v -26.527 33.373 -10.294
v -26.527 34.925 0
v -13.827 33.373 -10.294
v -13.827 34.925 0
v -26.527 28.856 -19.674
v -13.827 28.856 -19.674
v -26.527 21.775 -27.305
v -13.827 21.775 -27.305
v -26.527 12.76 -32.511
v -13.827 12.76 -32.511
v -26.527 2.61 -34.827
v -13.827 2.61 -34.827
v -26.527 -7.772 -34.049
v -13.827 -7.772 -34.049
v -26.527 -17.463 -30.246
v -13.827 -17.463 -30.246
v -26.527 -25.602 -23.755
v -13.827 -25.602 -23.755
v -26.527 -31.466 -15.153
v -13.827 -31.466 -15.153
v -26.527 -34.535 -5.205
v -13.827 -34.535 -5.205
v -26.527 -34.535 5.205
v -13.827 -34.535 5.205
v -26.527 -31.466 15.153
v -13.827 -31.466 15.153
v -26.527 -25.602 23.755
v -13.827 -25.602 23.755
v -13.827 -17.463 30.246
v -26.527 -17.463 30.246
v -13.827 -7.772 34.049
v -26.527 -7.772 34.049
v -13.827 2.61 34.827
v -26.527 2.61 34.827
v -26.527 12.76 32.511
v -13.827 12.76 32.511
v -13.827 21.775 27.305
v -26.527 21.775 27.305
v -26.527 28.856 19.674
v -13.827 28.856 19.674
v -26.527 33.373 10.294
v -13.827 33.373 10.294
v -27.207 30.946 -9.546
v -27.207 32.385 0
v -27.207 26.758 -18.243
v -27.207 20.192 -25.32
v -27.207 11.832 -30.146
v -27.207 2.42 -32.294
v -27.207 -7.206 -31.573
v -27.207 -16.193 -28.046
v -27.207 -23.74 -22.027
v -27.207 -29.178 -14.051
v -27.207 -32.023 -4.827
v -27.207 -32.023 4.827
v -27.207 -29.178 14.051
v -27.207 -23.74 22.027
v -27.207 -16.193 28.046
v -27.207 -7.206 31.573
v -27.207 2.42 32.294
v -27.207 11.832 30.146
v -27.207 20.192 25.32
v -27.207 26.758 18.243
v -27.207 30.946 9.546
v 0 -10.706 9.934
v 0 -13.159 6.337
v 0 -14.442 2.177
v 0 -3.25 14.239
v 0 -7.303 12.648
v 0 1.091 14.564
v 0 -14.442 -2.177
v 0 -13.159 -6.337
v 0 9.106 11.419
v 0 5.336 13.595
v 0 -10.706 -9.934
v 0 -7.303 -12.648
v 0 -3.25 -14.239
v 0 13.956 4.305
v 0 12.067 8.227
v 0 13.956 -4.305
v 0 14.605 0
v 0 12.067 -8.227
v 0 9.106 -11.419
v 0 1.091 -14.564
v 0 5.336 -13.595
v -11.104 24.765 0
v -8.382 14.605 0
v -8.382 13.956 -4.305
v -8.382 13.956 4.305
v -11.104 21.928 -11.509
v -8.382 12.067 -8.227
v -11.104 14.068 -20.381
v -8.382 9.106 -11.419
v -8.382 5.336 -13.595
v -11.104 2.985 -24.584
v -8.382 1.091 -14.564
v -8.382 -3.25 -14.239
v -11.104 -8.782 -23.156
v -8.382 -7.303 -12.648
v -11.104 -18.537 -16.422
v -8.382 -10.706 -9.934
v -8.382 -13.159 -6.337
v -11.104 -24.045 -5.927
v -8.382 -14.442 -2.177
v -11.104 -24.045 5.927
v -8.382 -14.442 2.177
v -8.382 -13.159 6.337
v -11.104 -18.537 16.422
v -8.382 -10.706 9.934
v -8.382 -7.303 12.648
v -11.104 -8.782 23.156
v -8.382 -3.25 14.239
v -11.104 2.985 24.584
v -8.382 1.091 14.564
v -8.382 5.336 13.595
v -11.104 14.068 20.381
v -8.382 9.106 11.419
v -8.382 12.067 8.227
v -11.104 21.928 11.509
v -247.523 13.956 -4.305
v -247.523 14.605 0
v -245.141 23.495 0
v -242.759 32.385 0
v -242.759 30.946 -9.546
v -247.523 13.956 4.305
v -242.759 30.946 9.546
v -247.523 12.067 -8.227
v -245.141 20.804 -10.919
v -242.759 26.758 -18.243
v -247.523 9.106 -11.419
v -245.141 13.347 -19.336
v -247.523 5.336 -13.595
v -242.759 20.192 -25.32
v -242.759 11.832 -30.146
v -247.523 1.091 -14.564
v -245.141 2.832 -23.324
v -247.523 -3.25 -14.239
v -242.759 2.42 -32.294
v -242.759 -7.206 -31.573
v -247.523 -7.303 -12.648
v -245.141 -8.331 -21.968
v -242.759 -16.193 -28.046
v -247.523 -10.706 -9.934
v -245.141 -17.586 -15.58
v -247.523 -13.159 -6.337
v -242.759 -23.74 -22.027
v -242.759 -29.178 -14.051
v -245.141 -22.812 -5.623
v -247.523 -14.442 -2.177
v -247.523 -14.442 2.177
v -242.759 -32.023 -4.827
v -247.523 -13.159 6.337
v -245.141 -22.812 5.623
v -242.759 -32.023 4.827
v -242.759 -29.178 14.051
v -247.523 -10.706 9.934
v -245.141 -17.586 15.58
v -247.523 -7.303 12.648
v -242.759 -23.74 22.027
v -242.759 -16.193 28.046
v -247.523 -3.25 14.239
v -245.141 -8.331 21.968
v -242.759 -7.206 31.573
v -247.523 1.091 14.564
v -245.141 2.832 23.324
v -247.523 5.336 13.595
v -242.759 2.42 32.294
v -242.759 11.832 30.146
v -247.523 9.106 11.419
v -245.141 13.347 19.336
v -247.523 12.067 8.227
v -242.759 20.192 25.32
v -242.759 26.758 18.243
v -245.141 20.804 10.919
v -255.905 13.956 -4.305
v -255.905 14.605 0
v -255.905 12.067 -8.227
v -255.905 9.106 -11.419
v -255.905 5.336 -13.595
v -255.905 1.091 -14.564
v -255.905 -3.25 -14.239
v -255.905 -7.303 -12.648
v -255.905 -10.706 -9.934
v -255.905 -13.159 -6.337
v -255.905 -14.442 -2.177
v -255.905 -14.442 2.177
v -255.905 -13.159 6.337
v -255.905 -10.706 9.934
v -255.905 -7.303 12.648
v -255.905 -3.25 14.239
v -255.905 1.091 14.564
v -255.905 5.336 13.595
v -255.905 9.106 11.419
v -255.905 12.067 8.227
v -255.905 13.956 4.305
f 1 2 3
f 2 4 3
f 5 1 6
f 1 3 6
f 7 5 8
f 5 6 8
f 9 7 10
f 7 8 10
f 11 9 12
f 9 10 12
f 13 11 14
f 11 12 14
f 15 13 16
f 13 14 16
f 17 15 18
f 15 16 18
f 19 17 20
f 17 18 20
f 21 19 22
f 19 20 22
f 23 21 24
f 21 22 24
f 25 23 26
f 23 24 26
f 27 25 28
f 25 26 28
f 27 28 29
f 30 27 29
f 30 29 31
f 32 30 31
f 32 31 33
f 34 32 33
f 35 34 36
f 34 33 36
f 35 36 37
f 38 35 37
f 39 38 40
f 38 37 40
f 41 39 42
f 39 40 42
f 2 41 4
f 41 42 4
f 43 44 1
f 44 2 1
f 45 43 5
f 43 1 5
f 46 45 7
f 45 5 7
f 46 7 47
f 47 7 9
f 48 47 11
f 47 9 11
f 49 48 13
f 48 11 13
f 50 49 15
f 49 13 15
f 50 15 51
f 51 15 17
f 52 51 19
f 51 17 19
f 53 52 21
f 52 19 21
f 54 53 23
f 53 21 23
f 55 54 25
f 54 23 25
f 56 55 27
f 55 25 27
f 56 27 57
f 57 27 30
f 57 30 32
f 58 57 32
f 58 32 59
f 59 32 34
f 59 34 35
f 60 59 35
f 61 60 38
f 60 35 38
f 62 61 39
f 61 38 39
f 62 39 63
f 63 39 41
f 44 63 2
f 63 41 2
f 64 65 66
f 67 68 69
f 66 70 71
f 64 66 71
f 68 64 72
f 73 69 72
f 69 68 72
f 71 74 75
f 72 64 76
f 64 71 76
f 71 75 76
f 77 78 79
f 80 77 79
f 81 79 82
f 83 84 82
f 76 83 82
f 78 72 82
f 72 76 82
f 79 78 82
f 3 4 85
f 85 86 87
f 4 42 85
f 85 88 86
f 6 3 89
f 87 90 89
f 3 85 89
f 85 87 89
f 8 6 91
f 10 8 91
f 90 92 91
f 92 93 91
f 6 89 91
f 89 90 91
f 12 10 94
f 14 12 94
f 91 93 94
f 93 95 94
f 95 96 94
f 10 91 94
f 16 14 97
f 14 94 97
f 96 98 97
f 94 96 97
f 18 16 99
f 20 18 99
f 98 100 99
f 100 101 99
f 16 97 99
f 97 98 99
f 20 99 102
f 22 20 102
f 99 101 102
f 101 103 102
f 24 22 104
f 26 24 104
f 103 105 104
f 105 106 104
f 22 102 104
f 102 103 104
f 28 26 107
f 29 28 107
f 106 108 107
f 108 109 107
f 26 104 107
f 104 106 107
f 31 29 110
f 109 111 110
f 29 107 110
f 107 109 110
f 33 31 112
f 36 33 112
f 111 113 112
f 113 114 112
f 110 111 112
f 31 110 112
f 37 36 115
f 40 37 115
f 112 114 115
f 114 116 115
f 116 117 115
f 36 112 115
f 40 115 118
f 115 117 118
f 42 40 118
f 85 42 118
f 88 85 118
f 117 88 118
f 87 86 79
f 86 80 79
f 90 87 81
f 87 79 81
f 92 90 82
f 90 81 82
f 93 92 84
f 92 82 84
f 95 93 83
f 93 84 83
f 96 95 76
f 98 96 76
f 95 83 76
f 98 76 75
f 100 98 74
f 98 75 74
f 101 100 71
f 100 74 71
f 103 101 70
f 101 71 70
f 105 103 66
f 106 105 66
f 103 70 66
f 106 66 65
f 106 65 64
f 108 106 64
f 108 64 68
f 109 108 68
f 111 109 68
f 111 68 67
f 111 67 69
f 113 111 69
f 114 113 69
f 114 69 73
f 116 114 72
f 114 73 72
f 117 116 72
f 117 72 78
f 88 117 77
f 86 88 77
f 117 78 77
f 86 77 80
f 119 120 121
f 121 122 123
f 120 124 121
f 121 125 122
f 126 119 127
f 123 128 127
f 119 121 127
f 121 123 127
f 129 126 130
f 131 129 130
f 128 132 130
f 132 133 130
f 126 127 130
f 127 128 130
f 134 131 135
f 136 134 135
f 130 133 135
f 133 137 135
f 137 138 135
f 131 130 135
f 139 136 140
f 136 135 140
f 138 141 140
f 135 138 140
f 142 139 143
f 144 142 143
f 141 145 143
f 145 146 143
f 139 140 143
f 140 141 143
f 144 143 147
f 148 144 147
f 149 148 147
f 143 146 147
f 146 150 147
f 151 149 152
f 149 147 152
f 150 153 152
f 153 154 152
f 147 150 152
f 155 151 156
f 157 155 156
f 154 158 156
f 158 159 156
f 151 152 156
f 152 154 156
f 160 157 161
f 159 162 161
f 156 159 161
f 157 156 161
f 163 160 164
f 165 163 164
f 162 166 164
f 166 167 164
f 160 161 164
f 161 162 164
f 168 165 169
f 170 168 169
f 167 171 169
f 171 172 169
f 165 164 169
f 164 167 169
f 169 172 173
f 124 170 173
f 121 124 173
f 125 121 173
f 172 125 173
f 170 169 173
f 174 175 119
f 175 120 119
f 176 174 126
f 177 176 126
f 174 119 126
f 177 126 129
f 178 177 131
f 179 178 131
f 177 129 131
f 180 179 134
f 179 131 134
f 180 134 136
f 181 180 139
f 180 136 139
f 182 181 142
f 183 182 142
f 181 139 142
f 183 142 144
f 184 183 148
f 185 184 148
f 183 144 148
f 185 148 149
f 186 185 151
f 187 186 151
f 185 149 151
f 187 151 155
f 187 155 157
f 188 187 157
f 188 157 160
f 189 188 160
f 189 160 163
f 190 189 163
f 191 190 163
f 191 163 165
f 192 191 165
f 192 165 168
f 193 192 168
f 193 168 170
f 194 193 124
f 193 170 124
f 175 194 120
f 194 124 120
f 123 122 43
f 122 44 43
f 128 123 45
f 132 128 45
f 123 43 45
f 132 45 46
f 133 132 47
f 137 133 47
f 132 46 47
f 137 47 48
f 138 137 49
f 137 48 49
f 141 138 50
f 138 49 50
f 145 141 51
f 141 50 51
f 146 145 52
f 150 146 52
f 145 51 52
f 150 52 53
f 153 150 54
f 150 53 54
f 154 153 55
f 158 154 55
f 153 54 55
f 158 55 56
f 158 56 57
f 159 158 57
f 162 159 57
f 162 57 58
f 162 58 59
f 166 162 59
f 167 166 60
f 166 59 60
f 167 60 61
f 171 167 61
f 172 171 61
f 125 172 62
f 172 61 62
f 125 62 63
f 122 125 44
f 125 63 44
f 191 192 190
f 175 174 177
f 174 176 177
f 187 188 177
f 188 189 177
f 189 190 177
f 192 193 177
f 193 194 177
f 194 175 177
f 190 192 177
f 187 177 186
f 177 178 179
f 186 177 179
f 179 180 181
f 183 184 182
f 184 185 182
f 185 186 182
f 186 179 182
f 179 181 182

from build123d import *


with BuildPart() as part:
    # Sketch1 → Revolve1 (revolve)
    with BuildSketch(Plane.XY):
        Polygon((0, 0), (-255.905, 0), (-255.905, 14.605), (-247.523, 14.605), (-242.758863359, 32.385), (-27.207318539, 32.385), (-26.52672759, 34.925), (-13.82672759, 34.925), (-8.382, 14.605), (0, 14.605), align=None)
    revolve(axis=Axis((0, 0, 0), (-1, 0, 0)))


solid = part.part
